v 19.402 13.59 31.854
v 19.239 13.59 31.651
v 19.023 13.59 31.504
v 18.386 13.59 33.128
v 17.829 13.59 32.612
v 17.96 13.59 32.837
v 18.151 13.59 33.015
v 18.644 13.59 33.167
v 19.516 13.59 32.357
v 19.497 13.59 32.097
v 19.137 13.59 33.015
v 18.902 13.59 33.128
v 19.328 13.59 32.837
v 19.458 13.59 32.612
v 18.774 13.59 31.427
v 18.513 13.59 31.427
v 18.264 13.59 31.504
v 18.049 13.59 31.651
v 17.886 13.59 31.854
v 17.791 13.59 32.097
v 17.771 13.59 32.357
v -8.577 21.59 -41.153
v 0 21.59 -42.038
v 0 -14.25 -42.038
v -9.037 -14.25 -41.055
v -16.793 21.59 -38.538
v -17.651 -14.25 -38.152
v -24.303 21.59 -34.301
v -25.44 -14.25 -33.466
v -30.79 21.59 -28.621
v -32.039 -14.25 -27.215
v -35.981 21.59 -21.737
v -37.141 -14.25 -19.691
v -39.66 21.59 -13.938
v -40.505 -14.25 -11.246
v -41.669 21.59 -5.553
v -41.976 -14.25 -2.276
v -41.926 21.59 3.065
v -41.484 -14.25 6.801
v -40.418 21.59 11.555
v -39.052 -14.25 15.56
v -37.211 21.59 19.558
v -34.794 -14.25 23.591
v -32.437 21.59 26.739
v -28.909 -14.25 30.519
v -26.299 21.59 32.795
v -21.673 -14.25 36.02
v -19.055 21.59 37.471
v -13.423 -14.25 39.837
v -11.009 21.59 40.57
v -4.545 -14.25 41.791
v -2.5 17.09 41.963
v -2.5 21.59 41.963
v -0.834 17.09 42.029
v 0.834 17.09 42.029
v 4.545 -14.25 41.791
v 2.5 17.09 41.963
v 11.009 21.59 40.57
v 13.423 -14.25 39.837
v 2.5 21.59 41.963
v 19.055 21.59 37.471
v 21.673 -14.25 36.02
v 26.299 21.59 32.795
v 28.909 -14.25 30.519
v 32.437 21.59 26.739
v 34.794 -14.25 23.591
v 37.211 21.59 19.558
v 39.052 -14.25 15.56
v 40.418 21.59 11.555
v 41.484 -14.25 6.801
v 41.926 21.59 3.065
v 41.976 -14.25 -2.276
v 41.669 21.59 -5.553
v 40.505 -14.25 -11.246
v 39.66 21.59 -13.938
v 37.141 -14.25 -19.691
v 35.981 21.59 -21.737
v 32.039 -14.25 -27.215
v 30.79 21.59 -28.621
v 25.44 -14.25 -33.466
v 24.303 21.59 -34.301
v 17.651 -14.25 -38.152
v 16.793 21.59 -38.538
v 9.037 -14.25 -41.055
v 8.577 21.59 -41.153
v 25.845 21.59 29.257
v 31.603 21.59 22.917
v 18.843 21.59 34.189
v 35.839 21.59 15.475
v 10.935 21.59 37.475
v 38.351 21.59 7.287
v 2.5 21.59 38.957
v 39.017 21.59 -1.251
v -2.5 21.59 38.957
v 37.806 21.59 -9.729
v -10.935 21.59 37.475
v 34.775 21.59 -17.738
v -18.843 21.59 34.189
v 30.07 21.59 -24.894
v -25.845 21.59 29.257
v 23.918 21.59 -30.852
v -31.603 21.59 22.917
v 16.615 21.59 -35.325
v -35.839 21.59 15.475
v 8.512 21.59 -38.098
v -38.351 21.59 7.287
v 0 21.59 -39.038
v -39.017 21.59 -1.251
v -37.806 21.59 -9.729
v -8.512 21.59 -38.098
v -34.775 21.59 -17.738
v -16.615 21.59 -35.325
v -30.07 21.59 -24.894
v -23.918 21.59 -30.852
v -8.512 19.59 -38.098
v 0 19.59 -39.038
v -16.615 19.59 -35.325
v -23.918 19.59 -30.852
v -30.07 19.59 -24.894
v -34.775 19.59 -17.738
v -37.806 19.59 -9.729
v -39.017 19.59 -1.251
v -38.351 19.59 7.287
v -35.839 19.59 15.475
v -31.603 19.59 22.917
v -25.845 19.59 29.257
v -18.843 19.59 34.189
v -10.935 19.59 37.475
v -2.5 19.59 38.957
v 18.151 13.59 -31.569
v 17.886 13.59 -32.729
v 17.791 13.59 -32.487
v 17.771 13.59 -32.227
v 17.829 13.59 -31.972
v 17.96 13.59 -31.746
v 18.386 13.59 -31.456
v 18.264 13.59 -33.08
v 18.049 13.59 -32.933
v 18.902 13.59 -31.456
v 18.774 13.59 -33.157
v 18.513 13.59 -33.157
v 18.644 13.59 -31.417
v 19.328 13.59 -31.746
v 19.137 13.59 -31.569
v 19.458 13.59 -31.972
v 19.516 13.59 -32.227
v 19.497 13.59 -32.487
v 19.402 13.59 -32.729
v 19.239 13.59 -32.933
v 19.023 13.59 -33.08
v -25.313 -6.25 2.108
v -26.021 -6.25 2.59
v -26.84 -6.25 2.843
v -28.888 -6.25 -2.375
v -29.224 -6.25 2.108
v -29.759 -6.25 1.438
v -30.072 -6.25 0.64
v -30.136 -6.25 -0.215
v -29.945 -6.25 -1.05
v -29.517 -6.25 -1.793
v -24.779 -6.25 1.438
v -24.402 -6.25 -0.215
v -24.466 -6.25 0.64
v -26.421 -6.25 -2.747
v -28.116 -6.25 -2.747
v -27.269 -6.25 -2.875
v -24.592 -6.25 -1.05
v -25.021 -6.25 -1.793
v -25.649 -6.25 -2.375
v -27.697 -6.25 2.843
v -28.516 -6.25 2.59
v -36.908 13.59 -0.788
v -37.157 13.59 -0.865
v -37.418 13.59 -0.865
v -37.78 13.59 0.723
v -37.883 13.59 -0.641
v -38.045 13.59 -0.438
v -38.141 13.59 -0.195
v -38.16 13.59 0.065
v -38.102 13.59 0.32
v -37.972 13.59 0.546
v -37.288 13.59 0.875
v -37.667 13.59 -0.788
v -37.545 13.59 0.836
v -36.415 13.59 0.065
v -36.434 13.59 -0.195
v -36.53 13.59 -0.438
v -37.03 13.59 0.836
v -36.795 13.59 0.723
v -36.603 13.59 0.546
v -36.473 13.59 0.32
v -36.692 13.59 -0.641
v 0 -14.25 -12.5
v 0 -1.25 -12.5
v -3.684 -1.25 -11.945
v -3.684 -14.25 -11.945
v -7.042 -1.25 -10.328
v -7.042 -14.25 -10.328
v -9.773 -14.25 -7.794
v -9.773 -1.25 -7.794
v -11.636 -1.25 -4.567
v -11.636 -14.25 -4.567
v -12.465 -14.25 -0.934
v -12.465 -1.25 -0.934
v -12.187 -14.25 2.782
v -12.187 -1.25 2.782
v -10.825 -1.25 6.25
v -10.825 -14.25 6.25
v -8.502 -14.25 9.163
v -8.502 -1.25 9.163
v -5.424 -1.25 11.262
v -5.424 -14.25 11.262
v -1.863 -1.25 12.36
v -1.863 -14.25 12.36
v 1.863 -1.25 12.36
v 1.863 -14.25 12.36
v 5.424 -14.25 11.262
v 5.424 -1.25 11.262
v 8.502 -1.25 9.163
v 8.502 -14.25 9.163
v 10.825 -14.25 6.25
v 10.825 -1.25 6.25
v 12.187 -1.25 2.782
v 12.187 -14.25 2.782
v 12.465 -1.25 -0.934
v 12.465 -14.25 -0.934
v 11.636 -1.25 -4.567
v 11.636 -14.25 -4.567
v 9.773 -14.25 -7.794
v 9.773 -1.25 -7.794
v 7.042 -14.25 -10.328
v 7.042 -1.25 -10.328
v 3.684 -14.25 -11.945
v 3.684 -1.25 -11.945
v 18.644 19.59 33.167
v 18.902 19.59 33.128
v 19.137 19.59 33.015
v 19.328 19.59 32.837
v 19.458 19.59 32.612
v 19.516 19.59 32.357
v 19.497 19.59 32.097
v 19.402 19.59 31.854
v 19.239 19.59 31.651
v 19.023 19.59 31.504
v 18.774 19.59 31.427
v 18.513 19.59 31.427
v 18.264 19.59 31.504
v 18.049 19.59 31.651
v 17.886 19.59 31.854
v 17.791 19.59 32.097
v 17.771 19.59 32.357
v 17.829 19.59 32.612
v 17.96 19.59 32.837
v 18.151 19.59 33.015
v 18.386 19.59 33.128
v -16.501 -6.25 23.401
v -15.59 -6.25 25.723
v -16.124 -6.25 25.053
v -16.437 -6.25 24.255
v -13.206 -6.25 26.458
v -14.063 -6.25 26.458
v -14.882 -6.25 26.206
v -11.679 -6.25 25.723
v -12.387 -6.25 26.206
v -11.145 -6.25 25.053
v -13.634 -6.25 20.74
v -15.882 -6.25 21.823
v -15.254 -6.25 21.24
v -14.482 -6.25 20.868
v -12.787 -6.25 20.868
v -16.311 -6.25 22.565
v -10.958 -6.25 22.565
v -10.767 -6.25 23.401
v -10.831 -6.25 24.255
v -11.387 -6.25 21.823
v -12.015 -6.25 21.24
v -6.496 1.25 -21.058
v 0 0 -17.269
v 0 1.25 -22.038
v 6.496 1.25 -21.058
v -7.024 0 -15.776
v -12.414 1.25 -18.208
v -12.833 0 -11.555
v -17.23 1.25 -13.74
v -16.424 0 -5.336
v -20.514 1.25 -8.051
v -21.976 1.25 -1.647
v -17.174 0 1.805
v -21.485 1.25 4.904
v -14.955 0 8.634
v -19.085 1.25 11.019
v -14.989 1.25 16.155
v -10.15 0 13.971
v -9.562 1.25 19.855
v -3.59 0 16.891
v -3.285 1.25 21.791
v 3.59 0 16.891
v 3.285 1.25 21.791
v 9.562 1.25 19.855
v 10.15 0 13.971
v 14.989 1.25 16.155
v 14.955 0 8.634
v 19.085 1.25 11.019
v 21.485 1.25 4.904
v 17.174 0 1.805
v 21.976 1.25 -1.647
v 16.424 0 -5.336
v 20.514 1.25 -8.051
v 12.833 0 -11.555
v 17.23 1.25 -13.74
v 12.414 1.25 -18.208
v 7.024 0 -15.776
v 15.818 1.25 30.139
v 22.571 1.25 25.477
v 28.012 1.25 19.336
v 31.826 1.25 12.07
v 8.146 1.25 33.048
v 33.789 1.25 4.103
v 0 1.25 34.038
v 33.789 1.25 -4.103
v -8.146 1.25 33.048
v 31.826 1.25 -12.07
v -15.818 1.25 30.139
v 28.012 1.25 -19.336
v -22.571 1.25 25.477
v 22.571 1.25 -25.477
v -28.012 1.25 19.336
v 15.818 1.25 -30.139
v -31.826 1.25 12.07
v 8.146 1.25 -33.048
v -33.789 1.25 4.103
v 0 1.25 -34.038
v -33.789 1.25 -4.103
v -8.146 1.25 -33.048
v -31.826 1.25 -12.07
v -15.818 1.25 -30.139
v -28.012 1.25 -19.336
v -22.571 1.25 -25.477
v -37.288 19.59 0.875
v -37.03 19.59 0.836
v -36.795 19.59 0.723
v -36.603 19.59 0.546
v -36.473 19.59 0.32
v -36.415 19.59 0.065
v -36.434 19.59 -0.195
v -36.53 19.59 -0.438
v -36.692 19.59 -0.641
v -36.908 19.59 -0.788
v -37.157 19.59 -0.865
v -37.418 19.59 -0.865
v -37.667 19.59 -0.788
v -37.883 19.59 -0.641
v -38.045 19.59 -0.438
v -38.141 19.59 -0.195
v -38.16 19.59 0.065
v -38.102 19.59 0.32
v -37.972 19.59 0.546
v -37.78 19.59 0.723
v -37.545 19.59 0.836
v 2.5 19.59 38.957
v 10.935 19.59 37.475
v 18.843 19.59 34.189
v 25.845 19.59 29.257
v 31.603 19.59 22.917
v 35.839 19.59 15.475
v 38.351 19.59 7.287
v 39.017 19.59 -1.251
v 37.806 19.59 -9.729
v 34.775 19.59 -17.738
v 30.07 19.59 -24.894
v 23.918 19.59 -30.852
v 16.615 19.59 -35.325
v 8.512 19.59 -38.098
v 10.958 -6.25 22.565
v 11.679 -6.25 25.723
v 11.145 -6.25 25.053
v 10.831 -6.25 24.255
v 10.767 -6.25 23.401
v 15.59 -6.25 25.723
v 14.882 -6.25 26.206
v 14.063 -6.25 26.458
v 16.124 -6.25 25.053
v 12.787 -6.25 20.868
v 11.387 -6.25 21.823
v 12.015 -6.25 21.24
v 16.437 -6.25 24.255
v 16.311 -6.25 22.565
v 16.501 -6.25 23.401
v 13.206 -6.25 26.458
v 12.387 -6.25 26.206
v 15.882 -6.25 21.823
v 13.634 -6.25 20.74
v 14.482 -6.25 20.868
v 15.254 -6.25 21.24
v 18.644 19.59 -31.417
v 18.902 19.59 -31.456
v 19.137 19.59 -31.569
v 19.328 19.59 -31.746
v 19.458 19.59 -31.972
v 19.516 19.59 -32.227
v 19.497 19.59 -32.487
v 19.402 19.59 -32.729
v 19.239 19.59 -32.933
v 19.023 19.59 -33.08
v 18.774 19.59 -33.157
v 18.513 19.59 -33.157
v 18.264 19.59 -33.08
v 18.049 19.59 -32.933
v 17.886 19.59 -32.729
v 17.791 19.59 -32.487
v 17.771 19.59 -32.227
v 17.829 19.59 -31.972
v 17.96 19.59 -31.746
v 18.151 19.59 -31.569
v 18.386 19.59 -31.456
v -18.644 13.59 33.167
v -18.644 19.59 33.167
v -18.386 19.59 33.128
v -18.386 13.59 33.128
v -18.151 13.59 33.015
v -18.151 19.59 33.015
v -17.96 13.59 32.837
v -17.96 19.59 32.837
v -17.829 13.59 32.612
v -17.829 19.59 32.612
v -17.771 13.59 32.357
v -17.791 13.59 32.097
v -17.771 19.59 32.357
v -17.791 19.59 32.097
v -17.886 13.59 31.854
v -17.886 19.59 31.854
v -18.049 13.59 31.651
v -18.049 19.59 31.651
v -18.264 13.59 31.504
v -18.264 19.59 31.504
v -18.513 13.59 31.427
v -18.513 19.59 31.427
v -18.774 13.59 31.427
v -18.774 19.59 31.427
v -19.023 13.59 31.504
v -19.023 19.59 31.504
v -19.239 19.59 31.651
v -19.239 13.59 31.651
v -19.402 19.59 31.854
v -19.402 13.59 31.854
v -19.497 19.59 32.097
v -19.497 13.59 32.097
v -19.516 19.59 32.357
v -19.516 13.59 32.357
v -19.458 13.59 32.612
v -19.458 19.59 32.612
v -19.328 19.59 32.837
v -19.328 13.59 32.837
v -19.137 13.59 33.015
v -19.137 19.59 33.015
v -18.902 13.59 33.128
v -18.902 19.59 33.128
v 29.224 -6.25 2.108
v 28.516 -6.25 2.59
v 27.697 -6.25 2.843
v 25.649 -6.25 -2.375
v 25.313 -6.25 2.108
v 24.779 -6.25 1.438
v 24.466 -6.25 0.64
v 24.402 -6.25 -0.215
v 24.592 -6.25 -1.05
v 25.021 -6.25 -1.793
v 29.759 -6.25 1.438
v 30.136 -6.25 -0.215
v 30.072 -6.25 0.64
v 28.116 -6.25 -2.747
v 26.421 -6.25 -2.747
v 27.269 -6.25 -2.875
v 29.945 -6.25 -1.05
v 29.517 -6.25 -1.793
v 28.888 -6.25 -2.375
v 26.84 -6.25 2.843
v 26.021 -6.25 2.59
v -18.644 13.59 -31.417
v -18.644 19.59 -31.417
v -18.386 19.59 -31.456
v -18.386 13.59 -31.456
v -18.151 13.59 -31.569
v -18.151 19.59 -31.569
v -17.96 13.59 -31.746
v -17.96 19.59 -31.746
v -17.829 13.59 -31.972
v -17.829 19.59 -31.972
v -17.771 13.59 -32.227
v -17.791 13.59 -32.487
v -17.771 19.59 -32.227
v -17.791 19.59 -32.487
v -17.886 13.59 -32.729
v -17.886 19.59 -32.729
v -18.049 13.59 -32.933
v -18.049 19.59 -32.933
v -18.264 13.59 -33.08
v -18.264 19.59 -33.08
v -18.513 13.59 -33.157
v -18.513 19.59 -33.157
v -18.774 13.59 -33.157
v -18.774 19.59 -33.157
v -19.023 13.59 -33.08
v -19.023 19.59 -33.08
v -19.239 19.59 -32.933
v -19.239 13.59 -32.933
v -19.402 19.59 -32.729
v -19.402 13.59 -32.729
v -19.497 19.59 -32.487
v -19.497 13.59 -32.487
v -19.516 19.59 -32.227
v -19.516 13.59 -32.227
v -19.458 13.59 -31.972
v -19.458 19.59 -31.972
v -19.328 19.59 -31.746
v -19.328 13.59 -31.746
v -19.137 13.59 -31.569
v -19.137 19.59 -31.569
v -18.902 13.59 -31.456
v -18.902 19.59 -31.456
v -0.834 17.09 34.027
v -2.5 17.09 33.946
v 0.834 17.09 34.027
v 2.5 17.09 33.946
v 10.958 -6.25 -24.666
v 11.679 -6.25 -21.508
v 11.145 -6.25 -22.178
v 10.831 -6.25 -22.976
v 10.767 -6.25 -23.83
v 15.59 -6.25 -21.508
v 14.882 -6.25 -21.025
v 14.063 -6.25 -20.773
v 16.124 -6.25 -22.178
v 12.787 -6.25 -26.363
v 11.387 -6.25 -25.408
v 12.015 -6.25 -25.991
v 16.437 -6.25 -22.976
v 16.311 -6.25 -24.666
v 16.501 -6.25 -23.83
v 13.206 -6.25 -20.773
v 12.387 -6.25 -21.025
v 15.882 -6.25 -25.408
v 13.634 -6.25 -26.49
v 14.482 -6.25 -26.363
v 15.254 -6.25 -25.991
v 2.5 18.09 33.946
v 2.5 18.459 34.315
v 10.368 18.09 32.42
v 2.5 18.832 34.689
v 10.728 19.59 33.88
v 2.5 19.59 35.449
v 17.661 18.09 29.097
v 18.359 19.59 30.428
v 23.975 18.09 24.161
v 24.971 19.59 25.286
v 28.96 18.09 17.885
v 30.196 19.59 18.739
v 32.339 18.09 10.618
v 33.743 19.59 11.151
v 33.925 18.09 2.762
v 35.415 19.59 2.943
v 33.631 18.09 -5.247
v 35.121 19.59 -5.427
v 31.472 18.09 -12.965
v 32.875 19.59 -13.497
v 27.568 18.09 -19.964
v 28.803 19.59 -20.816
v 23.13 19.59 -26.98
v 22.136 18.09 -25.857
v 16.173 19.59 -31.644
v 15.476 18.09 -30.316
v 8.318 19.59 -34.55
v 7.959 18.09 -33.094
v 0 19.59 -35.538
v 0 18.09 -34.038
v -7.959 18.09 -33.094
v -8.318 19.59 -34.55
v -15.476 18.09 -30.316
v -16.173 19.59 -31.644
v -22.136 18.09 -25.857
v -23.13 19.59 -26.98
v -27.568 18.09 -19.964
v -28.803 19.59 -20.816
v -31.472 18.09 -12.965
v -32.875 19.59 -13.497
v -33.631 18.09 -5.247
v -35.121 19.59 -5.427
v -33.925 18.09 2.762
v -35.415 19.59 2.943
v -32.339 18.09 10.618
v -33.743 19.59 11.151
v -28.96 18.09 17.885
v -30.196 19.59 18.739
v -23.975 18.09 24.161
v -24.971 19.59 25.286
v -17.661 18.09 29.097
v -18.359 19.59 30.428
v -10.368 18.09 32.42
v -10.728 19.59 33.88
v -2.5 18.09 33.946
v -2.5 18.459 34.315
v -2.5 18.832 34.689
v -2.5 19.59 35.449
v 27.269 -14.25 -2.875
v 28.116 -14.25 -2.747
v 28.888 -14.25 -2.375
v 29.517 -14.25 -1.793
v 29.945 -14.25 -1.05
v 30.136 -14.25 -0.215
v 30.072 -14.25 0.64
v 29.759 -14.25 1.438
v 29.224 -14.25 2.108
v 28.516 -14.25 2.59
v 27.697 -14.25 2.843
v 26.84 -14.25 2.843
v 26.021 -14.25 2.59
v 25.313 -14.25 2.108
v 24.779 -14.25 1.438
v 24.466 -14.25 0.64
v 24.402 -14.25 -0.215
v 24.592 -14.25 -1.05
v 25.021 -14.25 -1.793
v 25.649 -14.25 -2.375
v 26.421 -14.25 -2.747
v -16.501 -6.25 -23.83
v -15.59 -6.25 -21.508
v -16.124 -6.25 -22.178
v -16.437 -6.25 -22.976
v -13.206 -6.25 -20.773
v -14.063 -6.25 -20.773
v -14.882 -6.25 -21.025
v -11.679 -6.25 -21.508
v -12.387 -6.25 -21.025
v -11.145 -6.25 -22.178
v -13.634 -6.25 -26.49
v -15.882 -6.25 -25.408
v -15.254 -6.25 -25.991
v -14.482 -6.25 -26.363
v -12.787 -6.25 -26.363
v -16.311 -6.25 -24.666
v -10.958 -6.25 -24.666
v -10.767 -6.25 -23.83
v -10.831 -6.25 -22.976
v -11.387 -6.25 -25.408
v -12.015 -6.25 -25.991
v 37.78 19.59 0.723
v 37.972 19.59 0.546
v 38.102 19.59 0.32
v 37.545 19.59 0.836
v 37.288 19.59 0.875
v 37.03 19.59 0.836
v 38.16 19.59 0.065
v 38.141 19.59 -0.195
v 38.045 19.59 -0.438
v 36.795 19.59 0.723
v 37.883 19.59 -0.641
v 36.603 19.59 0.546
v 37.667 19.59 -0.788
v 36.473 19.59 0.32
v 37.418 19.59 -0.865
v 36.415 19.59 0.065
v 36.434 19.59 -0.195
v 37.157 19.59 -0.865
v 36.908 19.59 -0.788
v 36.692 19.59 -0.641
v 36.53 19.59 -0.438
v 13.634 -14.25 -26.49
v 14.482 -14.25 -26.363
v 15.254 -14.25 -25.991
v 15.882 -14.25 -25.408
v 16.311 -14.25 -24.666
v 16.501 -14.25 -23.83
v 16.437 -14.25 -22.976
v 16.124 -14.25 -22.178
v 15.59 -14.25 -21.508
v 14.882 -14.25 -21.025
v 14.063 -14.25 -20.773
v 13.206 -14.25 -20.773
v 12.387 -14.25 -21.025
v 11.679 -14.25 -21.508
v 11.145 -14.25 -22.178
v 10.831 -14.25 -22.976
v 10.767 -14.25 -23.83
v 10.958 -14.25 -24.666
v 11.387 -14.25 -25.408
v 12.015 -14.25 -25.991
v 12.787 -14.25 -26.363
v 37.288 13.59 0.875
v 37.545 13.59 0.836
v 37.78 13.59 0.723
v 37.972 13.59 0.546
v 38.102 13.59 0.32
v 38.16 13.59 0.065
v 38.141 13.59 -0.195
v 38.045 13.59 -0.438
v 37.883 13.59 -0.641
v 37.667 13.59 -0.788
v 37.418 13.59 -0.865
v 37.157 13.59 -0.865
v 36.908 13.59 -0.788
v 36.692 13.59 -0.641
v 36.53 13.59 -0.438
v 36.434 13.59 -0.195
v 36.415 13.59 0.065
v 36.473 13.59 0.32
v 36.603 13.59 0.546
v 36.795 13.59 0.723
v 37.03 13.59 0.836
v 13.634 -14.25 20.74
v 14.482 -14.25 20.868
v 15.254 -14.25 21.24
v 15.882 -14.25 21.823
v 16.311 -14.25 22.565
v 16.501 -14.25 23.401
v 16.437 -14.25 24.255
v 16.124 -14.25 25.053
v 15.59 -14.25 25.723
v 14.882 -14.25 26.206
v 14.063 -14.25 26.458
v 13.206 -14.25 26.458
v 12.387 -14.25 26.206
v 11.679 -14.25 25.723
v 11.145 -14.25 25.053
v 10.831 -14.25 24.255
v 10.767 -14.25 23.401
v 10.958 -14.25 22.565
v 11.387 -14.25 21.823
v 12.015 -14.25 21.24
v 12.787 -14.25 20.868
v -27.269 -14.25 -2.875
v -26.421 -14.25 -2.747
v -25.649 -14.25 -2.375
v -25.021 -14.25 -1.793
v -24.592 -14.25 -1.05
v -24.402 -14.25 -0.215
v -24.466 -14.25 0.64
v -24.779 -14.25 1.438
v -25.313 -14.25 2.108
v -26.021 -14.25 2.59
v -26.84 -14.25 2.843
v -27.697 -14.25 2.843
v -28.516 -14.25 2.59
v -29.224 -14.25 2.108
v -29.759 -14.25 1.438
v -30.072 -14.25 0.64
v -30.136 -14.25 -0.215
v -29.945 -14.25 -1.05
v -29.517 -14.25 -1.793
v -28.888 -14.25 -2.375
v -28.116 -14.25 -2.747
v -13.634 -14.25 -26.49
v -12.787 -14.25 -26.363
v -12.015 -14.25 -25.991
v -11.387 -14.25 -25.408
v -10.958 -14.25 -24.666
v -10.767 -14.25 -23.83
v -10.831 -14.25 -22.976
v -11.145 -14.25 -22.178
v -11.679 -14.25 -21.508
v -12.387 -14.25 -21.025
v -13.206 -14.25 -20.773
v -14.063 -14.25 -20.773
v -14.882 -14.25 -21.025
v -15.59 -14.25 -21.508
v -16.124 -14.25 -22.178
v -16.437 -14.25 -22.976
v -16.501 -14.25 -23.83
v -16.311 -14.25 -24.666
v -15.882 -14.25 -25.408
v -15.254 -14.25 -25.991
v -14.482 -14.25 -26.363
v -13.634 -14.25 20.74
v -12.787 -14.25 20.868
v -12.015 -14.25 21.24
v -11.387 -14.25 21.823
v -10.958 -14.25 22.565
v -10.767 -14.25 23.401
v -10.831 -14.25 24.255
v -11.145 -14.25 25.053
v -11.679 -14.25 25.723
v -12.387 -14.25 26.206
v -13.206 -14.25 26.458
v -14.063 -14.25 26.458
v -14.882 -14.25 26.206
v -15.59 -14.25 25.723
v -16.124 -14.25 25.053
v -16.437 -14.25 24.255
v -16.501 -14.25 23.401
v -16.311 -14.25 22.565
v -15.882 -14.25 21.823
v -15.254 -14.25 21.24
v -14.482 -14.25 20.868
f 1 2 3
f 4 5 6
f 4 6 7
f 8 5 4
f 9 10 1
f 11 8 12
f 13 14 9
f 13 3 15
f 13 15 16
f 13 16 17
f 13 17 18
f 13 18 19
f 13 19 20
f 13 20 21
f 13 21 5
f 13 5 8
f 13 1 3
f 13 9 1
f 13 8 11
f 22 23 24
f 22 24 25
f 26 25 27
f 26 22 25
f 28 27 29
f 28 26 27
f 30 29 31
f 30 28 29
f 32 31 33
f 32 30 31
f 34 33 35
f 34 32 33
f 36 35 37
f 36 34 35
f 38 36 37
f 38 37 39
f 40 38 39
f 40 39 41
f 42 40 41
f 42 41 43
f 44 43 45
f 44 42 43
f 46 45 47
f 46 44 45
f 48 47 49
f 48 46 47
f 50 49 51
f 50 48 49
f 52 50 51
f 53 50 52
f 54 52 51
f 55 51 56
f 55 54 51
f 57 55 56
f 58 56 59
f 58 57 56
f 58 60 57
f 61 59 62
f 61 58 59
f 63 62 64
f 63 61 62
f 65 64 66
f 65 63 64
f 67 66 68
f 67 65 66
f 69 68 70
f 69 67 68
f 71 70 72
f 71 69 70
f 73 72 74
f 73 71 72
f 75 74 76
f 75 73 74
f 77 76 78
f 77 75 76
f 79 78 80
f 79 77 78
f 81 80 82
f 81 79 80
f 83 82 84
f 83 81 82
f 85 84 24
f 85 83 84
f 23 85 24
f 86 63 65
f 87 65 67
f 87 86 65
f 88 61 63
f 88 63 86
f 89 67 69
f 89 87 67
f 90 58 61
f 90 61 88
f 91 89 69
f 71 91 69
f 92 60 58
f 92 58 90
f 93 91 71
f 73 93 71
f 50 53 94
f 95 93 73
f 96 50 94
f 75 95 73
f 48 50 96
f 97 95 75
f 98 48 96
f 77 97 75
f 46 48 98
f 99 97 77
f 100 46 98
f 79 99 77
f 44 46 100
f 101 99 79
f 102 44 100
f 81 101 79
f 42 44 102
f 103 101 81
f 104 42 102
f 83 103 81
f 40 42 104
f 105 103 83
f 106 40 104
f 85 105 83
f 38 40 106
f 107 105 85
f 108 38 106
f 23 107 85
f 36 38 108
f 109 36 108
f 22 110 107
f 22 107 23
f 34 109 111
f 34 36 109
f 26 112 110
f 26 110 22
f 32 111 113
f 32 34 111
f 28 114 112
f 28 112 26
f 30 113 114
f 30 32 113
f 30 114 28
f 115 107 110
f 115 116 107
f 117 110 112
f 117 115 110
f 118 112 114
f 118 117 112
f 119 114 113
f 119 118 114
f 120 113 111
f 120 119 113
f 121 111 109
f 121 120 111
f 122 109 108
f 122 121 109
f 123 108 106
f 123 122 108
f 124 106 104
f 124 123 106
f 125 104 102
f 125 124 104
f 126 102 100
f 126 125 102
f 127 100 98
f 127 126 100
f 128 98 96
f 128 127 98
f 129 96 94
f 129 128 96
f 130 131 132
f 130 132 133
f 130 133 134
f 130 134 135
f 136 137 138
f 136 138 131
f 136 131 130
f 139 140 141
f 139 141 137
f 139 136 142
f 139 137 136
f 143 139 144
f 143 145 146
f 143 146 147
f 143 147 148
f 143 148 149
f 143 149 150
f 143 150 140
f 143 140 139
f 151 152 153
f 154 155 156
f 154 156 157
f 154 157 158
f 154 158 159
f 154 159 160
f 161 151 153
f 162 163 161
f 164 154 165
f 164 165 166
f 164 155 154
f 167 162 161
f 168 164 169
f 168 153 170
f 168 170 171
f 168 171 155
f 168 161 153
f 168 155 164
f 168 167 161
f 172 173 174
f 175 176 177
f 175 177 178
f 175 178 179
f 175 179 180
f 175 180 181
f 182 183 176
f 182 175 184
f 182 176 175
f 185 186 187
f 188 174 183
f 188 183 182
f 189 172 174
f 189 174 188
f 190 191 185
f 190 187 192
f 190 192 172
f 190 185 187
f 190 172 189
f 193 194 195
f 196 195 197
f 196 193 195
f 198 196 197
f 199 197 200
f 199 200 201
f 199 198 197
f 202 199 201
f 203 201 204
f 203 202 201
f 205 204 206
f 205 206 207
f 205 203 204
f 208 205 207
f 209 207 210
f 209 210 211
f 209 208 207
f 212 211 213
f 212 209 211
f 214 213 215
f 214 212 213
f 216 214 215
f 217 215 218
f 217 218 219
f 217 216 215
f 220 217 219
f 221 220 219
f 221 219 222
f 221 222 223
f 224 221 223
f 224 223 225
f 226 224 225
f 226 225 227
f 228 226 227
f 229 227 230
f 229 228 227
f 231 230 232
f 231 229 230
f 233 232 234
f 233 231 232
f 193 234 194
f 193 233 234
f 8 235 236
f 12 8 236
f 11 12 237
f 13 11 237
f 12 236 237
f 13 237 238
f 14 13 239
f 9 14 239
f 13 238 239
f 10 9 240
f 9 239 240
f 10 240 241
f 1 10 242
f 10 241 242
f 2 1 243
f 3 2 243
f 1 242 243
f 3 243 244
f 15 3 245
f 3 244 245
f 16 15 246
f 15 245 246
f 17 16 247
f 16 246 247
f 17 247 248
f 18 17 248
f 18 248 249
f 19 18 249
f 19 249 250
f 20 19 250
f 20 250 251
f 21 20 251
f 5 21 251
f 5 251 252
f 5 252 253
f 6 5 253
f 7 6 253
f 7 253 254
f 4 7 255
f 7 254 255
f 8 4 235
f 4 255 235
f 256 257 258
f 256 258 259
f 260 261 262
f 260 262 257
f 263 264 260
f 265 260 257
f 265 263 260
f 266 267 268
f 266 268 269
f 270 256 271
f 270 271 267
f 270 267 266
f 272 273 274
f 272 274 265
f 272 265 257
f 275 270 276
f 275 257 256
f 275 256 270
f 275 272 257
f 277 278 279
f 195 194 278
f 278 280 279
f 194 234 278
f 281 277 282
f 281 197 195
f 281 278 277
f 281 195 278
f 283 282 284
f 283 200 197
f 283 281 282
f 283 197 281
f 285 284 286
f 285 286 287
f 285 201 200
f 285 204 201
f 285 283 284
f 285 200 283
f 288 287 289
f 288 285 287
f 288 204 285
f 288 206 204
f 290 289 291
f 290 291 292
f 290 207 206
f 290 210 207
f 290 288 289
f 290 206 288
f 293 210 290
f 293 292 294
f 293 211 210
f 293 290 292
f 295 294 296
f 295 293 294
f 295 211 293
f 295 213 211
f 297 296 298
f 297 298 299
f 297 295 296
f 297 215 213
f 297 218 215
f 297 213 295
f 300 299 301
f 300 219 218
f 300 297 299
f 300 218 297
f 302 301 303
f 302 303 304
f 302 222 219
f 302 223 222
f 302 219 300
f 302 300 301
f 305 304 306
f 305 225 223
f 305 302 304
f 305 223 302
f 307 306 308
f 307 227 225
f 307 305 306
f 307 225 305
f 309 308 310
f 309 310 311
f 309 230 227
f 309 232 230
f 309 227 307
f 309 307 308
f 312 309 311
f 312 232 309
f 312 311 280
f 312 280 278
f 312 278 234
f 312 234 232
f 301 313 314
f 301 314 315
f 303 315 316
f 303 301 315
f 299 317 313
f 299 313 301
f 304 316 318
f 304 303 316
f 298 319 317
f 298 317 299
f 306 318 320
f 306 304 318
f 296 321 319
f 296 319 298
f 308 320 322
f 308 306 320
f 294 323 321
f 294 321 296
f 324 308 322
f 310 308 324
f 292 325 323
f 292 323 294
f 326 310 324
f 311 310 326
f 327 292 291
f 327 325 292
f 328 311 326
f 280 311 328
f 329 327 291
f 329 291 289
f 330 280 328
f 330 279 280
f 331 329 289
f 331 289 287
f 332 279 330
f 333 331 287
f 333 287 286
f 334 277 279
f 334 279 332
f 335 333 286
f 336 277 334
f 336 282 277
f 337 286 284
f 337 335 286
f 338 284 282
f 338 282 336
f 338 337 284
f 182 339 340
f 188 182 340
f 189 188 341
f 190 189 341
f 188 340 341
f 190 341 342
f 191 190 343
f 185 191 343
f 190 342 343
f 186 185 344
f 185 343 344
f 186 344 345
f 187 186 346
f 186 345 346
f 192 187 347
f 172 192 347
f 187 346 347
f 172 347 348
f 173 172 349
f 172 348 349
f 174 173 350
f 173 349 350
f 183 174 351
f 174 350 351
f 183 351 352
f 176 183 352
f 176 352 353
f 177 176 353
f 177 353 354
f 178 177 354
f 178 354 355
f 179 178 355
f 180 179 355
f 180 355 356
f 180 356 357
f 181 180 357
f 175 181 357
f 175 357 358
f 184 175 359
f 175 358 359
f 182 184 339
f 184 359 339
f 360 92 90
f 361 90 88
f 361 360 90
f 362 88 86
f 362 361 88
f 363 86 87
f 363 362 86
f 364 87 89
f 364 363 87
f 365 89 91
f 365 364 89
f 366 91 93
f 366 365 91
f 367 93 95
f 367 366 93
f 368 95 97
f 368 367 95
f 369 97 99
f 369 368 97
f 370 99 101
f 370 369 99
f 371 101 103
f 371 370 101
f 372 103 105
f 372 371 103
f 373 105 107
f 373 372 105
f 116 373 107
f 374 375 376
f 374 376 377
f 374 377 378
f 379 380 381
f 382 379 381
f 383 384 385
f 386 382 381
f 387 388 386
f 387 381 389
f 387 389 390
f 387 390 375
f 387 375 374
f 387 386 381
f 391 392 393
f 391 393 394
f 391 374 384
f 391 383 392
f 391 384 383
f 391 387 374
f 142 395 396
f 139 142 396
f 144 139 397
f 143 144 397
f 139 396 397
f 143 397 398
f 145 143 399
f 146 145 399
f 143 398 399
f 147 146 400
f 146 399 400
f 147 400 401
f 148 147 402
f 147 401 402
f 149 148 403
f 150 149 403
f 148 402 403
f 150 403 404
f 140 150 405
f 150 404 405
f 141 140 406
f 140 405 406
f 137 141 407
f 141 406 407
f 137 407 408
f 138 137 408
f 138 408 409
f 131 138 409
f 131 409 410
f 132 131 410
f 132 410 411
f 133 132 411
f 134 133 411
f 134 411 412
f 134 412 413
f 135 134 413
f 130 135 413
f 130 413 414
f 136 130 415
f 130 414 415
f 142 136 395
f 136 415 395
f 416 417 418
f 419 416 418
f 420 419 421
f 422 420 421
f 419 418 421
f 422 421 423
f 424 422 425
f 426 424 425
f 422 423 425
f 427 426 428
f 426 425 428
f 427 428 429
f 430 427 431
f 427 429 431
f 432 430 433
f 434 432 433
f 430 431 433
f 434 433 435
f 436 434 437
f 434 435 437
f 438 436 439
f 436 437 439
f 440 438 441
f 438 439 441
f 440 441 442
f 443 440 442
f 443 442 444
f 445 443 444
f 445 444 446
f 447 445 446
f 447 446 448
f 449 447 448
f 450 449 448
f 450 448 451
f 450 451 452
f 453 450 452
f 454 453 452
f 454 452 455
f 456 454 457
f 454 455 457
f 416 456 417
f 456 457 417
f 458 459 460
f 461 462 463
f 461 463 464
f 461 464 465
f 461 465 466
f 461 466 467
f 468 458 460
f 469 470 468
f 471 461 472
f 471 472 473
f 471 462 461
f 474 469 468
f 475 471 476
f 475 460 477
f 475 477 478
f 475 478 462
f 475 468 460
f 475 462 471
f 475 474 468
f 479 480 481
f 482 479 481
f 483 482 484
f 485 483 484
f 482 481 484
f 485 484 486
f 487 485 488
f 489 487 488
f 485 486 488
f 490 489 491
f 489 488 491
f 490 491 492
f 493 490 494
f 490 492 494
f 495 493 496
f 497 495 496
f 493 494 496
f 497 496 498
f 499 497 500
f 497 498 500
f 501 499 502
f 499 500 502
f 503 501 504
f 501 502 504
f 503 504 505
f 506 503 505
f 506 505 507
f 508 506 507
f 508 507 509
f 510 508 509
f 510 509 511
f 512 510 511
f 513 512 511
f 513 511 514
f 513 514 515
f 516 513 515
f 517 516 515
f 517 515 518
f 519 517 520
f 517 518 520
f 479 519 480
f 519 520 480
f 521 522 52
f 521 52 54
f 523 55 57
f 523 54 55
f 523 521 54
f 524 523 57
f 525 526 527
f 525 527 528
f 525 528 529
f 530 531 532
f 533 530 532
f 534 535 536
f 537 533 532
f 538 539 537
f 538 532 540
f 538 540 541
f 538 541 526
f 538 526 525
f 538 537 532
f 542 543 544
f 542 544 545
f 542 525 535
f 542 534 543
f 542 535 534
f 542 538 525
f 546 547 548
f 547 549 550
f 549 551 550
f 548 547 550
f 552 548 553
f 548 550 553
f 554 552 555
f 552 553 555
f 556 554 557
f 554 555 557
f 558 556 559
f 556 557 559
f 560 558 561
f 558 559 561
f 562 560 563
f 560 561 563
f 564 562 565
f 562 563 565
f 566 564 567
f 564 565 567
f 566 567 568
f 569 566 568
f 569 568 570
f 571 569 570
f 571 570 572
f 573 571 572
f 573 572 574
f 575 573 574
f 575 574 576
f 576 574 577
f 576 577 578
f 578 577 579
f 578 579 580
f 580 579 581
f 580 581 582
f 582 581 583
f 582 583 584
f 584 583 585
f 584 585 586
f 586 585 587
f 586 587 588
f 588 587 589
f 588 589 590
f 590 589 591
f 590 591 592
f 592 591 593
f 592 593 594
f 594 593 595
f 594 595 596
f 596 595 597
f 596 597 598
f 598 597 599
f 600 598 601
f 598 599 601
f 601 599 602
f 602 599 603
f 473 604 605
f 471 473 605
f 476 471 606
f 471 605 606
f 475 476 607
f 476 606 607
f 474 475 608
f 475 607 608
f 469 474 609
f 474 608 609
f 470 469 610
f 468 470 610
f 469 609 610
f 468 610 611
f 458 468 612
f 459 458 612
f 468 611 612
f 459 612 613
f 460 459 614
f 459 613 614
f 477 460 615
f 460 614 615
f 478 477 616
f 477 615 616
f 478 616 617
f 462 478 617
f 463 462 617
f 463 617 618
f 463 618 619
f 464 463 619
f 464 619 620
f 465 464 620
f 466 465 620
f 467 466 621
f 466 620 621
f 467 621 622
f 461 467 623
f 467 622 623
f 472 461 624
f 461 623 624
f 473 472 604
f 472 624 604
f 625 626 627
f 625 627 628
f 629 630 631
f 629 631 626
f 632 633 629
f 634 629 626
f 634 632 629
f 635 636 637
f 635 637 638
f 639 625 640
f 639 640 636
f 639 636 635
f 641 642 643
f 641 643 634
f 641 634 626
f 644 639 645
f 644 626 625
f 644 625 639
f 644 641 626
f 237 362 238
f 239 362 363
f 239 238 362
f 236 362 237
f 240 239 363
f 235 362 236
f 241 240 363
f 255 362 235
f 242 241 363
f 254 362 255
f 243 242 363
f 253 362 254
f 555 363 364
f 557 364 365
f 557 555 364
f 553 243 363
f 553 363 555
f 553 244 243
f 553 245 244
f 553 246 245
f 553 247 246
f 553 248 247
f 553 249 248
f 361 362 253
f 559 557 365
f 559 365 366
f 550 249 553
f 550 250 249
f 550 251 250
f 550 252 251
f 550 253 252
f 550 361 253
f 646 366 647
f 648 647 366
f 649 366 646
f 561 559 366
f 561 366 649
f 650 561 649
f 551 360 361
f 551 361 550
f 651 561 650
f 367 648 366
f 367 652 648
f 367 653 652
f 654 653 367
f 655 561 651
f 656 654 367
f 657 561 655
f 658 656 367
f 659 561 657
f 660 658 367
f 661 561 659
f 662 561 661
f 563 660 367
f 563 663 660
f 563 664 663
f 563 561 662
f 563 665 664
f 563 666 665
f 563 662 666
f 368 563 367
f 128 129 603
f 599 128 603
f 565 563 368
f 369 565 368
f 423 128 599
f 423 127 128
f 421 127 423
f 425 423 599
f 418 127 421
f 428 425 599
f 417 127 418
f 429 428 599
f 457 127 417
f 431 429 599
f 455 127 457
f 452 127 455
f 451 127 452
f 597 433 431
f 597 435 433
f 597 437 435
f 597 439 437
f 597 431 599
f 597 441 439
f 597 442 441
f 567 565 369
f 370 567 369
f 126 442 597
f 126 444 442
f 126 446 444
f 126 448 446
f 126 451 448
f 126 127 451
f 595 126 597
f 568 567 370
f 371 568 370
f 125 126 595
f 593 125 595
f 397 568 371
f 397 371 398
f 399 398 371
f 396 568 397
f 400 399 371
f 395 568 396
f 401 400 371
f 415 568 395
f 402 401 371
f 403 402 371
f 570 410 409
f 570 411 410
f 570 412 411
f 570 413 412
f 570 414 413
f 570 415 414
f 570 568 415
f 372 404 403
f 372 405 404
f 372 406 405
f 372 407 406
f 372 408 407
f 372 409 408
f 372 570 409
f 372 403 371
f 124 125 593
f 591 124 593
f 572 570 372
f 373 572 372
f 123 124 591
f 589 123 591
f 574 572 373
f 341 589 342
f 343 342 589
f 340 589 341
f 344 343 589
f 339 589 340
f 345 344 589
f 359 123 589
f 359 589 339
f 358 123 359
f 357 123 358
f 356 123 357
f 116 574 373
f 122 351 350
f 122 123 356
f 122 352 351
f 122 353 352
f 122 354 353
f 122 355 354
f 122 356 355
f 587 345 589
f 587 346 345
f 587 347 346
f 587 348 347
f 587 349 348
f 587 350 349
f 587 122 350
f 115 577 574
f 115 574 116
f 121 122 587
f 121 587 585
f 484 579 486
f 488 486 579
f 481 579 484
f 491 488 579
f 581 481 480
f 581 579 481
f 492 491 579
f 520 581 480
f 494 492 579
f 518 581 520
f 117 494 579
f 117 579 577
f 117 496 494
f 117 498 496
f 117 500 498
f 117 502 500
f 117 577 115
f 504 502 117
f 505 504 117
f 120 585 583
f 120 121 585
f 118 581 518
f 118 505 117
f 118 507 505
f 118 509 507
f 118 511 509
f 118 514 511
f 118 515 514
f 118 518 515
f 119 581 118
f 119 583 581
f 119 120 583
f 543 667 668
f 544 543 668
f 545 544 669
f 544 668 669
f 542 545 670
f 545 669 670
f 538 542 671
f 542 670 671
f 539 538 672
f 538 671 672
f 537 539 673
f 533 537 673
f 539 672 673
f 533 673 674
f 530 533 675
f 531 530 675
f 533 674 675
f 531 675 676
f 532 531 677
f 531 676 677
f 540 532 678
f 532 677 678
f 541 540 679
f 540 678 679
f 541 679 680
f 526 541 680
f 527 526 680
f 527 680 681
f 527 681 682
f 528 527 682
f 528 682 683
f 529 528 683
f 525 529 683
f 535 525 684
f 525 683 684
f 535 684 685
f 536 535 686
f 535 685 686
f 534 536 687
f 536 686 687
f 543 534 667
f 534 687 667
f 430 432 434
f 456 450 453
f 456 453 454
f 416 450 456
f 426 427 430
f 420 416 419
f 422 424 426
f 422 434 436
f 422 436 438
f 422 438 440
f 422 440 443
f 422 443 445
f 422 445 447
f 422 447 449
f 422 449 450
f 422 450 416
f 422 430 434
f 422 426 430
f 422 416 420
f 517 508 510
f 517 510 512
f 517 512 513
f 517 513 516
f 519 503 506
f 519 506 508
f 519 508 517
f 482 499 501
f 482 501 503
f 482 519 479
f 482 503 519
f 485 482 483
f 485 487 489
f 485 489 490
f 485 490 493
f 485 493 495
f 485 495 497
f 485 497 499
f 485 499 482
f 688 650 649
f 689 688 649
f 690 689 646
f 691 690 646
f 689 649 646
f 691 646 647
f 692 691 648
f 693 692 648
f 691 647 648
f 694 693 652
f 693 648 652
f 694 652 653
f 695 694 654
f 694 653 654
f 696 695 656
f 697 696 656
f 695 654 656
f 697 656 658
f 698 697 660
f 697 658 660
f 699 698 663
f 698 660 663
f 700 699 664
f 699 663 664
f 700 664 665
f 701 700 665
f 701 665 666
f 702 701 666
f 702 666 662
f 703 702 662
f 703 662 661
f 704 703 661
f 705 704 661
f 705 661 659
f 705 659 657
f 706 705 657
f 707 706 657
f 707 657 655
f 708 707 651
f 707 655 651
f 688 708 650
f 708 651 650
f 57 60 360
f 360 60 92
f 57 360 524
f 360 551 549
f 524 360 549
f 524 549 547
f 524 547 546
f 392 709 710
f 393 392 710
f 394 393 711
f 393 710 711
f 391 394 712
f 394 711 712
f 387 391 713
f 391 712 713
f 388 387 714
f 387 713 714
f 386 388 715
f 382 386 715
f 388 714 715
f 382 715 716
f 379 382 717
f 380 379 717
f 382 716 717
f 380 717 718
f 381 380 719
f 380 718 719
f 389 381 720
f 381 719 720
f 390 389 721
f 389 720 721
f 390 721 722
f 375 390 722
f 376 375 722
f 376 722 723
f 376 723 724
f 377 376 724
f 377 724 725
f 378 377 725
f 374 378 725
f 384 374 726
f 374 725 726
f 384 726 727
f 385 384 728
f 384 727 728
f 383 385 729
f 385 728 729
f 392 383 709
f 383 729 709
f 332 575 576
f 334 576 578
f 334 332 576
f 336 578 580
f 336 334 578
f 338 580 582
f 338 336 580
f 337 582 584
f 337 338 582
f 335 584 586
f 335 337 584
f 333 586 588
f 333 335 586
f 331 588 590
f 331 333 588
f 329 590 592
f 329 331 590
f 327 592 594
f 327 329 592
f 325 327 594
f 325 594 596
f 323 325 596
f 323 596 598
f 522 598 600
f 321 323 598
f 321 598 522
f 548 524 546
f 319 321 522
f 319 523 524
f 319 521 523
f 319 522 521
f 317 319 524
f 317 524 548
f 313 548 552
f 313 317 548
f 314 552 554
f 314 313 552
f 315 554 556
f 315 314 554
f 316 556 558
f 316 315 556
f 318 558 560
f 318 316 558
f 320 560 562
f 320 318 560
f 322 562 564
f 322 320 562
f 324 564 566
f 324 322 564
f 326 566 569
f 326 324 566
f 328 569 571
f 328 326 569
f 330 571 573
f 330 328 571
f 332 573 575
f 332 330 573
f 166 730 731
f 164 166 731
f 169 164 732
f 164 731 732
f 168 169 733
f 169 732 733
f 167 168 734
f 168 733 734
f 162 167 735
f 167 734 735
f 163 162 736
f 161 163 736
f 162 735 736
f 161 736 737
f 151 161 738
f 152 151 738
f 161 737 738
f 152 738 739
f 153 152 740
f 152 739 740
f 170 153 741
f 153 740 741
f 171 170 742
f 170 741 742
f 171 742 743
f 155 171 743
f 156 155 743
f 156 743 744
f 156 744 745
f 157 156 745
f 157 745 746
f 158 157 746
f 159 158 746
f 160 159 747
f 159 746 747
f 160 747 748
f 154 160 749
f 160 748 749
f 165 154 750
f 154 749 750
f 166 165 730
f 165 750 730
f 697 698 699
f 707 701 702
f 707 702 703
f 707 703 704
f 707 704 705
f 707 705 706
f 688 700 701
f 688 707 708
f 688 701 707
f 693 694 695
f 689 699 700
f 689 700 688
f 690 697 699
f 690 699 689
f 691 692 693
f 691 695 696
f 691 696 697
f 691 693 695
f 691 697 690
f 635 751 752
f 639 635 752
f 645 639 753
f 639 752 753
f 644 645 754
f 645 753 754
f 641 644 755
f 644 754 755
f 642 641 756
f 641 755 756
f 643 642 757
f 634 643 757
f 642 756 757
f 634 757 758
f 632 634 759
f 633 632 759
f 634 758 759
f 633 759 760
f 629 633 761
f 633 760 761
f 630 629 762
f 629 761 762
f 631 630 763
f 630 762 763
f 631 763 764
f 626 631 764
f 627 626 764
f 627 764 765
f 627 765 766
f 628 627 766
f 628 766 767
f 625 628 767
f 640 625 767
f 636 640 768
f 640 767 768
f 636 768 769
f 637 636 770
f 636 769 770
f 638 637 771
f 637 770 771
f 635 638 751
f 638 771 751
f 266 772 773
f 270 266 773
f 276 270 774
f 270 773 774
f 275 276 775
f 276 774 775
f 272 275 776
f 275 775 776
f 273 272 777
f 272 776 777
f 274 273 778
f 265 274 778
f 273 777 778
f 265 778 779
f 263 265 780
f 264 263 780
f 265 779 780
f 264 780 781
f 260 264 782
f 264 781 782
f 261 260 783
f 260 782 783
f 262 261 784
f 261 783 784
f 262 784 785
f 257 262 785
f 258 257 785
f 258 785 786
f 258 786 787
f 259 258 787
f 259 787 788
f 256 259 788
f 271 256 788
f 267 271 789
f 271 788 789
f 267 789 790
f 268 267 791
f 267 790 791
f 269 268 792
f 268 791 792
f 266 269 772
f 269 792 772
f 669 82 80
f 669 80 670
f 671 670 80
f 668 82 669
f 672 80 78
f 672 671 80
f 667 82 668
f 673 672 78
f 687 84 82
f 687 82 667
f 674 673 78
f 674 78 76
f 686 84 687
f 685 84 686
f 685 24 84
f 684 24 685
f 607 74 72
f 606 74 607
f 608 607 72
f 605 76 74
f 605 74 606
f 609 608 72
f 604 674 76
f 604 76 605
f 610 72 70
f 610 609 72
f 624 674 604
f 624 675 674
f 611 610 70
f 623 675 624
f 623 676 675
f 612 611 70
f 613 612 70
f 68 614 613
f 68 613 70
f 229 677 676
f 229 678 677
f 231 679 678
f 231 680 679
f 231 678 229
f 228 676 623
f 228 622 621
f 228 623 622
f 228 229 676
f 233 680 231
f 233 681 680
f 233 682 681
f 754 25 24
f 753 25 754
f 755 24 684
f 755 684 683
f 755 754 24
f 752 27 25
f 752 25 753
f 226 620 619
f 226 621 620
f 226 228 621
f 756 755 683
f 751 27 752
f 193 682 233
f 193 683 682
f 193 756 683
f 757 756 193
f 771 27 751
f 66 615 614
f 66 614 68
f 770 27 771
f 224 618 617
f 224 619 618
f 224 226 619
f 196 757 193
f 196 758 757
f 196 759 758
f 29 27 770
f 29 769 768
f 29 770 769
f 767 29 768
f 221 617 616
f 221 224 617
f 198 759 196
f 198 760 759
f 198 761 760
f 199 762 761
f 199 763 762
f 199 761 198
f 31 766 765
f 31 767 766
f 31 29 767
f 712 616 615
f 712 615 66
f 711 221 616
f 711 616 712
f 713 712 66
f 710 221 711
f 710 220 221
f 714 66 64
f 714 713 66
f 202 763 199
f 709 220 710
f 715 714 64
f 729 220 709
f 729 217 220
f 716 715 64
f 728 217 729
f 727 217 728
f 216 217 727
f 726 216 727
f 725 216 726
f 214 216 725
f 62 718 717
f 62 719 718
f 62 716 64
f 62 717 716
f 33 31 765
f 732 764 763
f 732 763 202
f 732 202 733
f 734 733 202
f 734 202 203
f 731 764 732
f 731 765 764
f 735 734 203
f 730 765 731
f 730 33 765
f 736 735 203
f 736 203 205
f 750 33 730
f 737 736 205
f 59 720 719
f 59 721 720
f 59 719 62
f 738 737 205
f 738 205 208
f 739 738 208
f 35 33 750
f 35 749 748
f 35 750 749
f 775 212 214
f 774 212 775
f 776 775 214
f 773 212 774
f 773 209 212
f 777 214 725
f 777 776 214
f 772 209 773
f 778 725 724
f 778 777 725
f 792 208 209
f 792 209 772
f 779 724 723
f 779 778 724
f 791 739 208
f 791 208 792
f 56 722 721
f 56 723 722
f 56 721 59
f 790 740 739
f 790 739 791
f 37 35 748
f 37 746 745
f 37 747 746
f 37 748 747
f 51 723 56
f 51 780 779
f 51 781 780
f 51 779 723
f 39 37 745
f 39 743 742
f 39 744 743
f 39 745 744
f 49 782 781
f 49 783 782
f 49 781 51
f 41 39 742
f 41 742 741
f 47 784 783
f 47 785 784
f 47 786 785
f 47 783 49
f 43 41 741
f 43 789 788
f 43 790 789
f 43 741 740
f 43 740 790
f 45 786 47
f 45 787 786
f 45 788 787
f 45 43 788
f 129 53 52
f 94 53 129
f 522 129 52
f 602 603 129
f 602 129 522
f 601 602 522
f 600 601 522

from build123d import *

# Parameters (mm, degrees)
SKETCH8_W         = 5
SKETCH8_H         = 8.09193466
WIRE_HOLE_DEPTH   = 4.5
CHAMFER1_SIZE     = 1.5
SKETCH9_R         = 0.875
FRONT_HOLES_DEPTH = 6
SKETCH10_R        = 2.875
BACK_HOLES_DEPTH  = 8


with BuildPart() as part:
    # Sketch7 → Base Motor Housing (revolve)
    with BuildSketch(Plane.XY, mode=Mode.PRIVATE) as base_motor_housing_sk:
        Polygon((-42.0375, 21.59), (-39.0375, 21.59), (-39.0375, 19.59), (-34.0375, 19.59), (-34.0375, 1.25), (-22.0375, 1.25), (-12.5, -1.25), (-12.5, -14.25), (-42.0375, -14.25), align=None)
    revolve(base_motor_housing_sk.sketch.rotate(Axis((0, -30.231871117, 0), (0, 1, 0)), 270), axis=Axis((0, -30.231871117, 0), (0, 1, 0)))

    # Sketch8 → Wire Hole (cut)
    with BuildSketch(Plane(origin=(0, 21.59, 0), x_dir=(1, 0, 0), z_dir=(0, 1, 0))):
        with Locations((0, -37.99153267)):
            Rectangle(SKETCH8_W, SKETCH8_H)
    extrude(amount=-WIRE_HOLE_DEPTH, mode=Mode.SUBTRACT)

    # Chamfer1
    chamfer1_edges = [part.edges().sort_by_distance(p)[0] for p in [
        (34.01450857, 19.59, -1.250844913),
    ]]
    chamfer(chamfer1_edges, length=CHAMFER1_SIZE)

    # Sketch9 → Front-Holes (cut)
    with BuildSketch(Plane(origin=(0, 19.59, 0), x_dir=(1, 0, 0), z_dir=(0, 1, 0))):
        with Locations(Location((-37.2875, 0, 0), (0, 0, 270))):
            Circle(SKETCH9_R)
        with Locations(Location((-18.64375, 32.291922244, 0), (0, 0, 270))):
            Circle(SKETCH9_R)
        with Locations(Location((18.64375, 32.291922244, 0), (0, 0, 270))):
            Circle(SKETCH9_R)
        with Locations(Location((37.2875, 0, 0), (0, 0, 270))):
            Circle(SKETCH9_R)
        with Locations(Location((18.64375, -32.291922244, 0), (0, 0, 270))):
            Circle(SKETCH9_R)
        with Locations(Location((-18.64375, -32.291922244, 0), (0, 0, 270))):
            Circle(SKETCH9_R)
    extrude(amount=-FRONT_HOLES_DEPTH, mode=Mode.SUBTRACT)

    # Sketch10 → Back-Holes (cut)
    with BuildSketch(Plane.XZ.offset(14.25)):
        with Locations(Location((-27.26875, 0, 0), (0, 0, 270))):
            Circle(SKETCH10_R)
        with Locations(Location((-13.634375, 23.615430229, 0), (0, 0, 270))):
            Circle(SKETCH10_R)
        with Locations(Location((13.634375, 23.615430229, 0), (0, 0, 270))):
            Circle(SKETCH10_R)
        with Locations(Location((27.26875, 0, 0), (0, 0, 270))):
            Circle(SKETCH10_R)
        with Locations(Location((13.634375, -23.615430229, 0), (0, 0, 270))):
            Circle(SKETCH10_R)
        with Locations(Location((-13.634375, -23.615430229, 0), (0, 0, 270))):
            Circle(SKETCH10_R)
    extrude(amount=-BACK_HOLES_DEPTH, mode=Mode.SUBTRACT)


solid = part.part
